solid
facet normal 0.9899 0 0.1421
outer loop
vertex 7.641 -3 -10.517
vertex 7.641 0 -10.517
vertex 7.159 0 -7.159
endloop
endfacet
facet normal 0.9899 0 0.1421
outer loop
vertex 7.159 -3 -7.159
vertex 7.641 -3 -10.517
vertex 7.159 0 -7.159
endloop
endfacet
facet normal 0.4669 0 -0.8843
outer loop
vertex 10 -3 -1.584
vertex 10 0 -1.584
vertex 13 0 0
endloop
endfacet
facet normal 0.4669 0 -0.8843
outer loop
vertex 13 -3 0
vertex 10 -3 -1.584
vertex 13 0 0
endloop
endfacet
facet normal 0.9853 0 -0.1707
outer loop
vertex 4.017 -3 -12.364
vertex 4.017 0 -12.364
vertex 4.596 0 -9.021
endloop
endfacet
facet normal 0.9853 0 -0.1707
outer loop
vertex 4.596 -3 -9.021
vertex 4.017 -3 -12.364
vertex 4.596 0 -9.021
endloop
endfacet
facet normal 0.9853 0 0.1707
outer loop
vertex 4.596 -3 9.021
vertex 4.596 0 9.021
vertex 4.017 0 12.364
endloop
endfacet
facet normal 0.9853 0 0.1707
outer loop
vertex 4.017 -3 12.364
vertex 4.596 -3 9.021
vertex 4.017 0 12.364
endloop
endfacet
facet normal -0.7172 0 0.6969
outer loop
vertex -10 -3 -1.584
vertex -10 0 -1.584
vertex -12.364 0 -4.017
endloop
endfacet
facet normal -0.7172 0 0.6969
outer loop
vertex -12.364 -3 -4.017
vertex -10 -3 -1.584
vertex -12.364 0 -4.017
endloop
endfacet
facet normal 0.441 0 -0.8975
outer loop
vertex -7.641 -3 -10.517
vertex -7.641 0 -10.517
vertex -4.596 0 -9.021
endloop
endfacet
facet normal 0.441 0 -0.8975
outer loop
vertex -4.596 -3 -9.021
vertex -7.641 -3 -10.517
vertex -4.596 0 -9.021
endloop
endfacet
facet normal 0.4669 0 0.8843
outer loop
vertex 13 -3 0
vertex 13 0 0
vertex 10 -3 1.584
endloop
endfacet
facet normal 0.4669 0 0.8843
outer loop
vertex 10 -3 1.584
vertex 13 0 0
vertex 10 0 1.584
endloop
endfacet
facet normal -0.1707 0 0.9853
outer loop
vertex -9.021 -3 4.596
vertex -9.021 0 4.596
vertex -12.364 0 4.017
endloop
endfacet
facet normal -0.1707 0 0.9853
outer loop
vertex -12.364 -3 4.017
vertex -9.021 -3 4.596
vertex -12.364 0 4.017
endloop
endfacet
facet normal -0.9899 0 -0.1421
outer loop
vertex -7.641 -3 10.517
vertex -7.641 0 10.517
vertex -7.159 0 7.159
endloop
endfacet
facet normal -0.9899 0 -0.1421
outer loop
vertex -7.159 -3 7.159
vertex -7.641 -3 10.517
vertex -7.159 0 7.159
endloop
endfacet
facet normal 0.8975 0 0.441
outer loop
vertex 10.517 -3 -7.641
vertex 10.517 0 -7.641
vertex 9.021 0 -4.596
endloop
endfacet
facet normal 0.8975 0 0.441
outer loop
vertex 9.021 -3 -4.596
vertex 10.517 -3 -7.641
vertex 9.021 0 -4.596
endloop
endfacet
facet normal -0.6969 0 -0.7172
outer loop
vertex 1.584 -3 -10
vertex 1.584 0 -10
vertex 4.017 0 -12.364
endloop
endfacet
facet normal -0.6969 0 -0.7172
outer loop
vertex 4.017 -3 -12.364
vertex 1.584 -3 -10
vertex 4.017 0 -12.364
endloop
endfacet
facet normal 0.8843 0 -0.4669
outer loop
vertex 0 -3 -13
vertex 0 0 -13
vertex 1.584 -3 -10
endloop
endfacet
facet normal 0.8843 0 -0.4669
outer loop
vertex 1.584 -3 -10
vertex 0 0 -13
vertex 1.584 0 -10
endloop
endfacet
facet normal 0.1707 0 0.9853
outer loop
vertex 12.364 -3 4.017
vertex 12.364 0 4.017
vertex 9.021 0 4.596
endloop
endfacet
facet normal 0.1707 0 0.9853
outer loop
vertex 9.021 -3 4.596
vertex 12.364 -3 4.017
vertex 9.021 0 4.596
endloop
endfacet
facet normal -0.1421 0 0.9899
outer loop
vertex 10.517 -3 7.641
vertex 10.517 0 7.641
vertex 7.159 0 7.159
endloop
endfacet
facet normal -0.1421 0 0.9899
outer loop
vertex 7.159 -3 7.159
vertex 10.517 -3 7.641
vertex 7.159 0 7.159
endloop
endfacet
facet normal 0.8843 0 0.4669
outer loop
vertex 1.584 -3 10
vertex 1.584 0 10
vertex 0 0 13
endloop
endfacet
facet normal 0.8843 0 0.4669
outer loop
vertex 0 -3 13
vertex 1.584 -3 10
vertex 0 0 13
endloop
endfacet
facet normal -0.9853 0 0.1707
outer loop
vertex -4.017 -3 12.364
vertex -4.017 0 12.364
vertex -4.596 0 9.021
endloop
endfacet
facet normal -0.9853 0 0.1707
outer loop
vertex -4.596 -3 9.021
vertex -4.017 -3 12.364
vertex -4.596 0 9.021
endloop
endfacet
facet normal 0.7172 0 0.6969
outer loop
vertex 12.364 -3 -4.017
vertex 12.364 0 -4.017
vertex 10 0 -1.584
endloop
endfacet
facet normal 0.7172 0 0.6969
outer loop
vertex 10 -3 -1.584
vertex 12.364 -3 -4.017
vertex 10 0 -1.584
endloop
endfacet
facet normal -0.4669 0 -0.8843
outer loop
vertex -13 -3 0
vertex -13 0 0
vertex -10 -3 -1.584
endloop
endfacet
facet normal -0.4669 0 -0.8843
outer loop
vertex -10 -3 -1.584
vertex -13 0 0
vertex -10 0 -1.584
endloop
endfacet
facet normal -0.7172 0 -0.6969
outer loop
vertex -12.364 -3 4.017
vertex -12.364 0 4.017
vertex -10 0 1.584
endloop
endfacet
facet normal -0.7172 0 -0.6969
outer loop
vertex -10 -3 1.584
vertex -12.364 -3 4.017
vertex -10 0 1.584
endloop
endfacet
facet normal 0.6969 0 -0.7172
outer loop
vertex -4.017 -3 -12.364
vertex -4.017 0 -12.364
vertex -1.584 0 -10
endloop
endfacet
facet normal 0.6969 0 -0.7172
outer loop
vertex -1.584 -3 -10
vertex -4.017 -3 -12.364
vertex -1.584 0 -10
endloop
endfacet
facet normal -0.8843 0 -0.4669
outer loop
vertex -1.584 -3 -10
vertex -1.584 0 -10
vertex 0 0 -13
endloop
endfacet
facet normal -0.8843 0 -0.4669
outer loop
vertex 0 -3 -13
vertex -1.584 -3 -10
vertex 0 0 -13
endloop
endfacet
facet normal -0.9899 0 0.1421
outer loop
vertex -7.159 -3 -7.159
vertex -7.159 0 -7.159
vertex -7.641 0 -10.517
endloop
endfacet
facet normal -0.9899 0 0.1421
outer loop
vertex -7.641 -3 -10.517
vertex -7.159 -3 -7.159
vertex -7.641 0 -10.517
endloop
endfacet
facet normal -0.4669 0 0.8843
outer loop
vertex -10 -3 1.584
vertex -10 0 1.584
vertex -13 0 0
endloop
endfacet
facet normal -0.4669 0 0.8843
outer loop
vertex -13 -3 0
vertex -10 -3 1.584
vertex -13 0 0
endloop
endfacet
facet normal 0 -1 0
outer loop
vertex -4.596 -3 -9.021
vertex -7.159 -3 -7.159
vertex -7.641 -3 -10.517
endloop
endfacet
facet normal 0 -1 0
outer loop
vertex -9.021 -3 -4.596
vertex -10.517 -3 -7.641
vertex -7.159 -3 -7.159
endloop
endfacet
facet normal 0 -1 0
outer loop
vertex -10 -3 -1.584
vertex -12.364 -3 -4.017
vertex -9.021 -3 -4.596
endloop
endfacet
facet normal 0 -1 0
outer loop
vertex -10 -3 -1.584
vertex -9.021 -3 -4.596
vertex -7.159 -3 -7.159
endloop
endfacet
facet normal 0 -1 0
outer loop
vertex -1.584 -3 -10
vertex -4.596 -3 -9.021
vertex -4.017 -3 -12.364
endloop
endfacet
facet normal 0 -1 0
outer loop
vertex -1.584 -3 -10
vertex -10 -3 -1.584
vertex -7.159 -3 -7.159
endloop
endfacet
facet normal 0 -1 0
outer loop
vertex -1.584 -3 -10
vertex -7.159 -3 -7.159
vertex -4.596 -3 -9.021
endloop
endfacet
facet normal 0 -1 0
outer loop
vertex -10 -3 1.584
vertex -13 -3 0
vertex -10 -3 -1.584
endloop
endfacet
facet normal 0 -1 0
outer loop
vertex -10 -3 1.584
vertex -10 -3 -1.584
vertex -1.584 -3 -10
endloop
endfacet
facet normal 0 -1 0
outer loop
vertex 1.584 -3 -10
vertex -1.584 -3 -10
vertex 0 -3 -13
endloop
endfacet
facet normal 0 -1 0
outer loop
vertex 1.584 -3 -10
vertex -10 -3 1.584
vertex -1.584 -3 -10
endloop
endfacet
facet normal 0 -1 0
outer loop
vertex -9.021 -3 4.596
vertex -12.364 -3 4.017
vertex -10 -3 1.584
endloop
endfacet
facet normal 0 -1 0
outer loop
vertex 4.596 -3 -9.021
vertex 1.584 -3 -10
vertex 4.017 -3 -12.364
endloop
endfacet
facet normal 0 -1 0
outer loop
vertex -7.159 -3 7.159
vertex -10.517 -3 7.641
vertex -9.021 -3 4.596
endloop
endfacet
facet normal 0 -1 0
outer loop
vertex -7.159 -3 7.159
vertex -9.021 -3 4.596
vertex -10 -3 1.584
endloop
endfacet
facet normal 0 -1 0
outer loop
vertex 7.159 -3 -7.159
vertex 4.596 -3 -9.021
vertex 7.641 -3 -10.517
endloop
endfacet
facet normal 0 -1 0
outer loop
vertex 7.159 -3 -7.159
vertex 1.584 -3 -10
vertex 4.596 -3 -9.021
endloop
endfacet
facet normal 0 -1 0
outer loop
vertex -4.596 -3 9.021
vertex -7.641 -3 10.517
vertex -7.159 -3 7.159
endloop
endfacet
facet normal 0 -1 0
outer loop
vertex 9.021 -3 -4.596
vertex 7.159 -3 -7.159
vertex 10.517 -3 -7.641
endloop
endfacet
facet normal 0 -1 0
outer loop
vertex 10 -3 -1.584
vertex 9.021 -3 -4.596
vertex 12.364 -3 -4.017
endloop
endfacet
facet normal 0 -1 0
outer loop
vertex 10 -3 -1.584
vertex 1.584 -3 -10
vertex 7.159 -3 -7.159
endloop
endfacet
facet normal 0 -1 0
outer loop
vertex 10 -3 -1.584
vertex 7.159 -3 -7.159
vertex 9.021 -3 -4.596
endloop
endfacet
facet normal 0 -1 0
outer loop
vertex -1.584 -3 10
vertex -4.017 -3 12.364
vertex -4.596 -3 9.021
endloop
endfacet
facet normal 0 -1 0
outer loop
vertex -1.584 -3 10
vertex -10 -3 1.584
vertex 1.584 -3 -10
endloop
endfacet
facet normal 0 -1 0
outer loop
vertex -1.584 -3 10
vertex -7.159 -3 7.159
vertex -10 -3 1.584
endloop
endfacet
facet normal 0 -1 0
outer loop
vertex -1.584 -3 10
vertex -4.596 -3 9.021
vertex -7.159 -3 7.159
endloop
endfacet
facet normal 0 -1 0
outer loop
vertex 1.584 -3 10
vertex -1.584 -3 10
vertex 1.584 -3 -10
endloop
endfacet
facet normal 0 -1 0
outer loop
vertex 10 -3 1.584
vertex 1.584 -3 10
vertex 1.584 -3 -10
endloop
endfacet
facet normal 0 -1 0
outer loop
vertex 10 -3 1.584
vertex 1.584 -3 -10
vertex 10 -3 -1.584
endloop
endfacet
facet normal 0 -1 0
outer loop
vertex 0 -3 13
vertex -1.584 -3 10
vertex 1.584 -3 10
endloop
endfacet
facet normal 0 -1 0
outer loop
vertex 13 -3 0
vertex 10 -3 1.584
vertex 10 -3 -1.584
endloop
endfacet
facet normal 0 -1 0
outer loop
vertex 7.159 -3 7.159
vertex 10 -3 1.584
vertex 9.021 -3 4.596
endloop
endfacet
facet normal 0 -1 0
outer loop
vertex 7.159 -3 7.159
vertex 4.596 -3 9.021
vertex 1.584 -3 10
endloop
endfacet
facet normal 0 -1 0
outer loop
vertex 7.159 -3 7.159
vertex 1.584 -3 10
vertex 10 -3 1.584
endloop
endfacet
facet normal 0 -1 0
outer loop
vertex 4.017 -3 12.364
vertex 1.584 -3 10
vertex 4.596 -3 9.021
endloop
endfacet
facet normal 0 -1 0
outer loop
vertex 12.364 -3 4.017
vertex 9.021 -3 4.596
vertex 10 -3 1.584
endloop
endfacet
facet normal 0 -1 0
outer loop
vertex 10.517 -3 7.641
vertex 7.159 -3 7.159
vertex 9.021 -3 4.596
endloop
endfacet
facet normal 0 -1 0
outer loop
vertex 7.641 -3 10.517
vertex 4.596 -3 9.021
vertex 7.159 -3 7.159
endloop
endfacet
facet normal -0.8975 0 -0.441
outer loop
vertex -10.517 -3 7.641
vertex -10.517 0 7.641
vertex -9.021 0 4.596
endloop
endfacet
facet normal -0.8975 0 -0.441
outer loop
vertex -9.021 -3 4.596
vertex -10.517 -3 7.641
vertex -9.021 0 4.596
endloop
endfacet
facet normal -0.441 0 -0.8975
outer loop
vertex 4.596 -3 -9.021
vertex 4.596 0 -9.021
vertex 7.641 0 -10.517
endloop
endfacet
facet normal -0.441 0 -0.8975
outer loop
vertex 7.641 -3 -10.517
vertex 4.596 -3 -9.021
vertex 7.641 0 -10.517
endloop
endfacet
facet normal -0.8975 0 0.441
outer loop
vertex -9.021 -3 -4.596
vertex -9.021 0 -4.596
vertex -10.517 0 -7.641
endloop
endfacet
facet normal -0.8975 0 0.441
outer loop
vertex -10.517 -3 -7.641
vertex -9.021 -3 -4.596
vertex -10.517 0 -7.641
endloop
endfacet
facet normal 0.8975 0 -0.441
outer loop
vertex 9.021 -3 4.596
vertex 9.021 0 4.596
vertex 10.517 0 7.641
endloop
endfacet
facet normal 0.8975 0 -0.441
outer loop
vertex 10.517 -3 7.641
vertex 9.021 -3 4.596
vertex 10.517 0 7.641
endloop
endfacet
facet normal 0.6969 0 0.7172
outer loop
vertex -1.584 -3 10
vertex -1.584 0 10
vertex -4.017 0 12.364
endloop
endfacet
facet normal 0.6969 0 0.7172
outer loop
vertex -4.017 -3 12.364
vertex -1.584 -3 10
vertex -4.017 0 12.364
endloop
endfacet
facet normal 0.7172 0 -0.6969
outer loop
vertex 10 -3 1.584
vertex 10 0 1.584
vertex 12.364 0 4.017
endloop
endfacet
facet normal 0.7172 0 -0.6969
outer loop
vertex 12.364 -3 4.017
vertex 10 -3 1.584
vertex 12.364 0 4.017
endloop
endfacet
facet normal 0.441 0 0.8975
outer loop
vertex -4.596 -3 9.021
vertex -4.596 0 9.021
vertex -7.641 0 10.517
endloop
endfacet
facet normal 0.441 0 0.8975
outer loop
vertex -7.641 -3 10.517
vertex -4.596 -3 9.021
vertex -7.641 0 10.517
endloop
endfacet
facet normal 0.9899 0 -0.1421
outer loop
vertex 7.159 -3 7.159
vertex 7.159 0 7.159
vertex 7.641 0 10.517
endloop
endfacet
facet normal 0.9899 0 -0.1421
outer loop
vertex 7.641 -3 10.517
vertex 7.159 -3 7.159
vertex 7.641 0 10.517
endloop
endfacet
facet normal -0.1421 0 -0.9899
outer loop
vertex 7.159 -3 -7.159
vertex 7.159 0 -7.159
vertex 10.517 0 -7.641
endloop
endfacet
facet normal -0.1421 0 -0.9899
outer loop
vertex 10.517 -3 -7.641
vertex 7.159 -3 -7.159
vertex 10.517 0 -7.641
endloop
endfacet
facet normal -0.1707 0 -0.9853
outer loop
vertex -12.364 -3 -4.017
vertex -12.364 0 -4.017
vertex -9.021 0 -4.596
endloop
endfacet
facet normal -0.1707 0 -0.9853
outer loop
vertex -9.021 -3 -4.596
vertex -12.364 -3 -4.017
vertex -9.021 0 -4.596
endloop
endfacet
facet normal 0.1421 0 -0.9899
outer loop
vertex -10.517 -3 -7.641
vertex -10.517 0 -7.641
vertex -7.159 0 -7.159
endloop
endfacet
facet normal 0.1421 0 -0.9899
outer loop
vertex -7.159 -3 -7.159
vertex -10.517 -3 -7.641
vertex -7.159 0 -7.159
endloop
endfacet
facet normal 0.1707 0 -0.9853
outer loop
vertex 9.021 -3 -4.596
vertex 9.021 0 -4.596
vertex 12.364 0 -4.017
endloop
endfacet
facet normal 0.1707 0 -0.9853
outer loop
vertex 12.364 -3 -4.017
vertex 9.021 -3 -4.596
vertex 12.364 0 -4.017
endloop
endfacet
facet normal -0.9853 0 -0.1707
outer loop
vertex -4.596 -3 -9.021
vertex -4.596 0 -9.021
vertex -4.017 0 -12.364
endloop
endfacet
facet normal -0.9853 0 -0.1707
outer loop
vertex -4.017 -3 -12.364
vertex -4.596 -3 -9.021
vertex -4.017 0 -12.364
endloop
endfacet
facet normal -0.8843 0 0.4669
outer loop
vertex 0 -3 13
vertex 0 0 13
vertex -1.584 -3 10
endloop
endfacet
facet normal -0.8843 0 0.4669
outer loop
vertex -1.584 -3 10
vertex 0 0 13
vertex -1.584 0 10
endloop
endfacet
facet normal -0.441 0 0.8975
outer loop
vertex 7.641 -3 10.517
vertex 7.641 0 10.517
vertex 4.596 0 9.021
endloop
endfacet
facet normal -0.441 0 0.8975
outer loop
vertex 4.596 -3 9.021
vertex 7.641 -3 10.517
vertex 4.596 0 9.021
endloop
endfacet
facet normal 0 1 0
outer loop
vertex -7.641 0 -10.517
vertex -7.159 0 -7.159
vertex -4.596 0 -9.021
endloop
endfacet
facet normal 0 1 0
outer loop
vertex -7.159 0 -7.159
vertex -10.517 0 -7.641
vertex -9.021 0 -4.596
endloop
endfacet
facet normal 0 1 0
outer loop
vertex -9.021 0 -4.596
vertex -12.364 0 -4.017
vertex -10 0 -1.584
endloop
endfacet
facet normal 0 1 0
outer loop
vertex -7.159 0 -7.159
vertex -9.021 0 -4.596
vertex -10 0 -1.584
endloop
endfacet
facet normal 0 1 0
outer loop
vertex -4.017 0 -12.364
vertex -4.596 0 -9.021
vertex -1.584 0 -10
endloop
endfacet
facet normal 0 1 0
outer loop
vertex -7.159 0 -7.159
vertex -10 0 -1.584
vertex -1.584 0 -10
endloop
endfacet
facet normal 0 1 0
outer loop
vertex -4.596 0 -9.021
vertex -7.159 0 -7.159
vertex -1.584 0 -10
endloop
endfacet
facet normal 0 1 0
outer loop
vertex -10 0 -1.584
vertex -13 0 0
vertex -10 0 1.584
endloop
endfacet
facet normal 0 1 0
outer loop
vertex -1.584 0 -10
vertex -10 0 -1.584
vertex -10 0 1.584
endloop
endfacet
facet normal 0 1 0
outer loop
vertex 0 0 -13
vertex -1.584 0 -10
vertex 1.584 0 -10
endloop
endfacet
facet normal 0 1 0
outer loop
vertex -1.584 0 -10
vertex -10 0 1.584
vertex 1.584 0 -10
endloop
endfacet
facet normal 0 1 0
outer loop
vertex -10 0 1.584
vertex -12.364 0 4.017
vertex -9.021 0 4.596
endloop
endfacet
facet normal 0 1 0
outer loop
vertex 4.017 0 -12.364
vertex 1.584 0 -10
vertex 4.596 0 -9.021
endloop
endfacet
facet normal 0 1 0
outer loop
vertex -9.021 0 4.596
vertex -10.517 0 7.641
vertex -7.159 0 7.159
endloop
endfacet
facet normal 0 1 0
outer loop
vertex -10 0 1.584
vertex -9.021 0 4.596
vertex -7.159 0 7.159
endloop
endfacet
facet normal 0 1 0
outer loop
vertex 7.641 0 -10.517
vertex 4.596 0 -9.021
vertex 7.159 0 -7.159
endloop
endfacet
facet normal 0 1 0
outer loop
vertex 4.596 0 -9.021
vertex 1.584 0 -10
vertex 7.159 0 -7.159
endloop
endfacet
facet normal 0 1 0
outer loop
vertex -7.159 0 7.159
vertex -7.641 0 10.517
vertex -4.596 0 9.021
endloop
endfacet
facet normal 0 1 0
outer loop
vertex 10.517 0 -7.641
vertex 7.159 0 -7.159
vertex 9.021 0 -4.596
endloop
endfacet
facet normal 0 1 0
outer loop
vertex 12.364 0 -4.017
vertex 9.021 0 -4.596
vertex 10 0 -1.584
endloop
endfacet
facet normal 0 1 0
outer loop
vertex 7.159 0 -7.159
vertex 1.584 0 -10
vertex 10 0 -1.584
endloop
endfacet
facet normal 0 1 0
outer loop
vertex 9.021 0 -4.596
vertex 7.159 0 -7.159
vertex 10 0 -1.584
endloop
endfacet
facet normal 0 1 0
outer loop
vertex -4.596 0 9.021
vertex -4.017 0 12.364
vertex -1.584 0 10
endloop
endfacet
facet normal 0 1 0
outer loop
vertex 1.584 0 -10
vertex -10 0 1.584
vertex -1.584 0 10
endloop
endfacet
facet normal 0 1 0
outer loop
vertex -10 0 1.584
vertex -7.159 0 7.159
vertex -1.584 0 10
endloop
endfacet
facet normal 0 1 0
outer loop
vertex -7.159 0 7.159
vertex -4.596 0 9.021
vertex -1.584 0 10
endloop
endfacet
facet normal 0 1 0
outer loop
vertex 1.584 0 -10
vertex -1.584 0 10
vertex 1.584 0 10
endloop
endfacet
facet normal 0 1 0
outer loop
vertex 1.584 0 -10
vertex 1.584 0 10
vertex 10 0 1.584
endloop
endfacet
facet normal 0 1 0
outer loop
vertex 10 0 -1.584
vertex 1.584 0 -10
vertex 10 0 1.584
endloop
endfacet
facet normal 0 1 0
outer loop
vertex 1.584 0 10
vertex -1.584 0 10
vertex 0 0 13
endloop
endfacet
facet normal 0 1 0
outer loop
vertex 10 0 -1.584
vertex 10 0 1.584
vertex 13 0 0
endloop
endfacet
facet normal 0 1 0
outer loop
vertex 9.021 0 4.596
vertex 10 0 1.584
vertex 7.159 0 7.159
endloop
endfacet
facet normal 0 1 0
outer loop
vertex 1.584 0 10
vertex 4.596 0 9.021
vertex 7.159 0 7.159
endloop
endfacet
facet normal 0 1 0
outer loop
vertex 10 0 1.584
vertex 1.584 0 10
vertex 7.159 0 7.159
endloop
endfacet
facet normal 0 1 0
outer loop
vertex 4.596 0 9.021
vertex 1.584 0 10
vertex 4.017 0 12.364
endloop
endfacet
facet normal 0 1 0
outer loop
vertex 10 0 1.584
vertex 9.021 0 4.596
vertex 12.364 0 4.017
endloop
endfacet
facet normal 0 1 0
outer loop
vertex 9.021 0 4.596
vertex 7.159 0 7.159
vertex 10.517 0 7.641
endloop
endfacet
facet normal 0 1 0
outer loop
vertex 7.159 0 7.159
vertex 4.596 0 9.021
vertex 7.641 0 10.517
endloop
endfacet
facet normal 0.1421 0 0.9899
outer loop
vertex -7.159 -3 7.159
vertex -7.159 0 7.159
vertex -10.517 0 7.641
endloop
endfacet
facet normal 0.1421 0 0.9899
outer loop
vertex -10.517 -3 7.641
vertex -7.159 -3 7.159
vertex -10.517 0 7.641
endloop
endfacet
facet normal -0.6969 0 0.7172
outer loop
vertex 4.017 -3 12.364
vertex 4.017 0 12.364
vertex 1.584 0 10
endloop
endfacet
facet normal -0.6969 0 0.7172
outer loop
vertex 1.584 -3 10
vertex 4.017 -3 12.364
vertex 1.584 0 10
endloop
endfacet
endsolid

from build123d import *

# Parameters (mm, degrees)
F1_DEPTH = 3


with BuildPart() as f1:
    # F0 (on Front) → F1 (new body)
    with BuildSketch(Plane.XZ):
        Polygon((13, 0), (10, 1.5838444032), (10, -1.5838444032), align=None)
        Polygon((10, -1.5838444032), (10, 1.5838444032), (9.0211303259, 4.5964954843), (7.1592095616, 7.1592095616), (4.5964954843, 9.0211303259), (1.5838444032, 10), (-1.5838444032, 10), (-4.5964954843, 9.0211303259), (-7.1592095616, 7.1592095616), (-9.0211303259, 4.5964954843), (-10, 1.5838444032), (-10, -1.5838444032), (-9.0211303259, -4.5964954843), (-7.1592095616, -7.1592095616), (-4.5964954843, -9.0211303259), (-1.5838444032, -10), (1.5838444032, -10), (4.5964954843, -9.0211303259), (7.1592095616, -7.1592095616), (9.0211303259, -4.5964954843), align=None)
        Polygon((9.0211303259, 4.5964954843), (10, 1.5838444032), (12.3637347118, 4.0172209269), align=None)
        Polygon((12.3637347118, -4.0172209269), (10, -1.5838444032), (9.0211303259, -4.5964954843), align=None)
        Polygon((7.1592095616, 7.1592095616), (9.0211303259, 4.5964954843), (10.5172209269, 7.6412082798), align=None)
        Polygon((10.5172209269, -7.6412082798), (9.0211303259, -4.5964954843), (7.1592095616, -7.1592095616), align=None)
        Polygon((4.5964954843, 9.0211303259), (7.1592095616, 7.1592095616), (7.6412082798, 10.5172209269), align=None)
        Polygon((7.6412082798, -10.5172209269), (7.1592095616, -7.1592095616), (4.5964954843, -9.0211303259), align=None)
        Polygon((1.5838444032, 10), (4.5964954843, 9.0211303259), (4.0172209269, 12.3637347118), align=None)
        Polygon((4.0172209269, -12.3637347118), (4.5964954843, -9.0211303259), (1.5838444032, -10), align=None)
        Polygon((-1.5838444032, 10), (1.5838444032, 10), (0, 13), align=None)
        Polygon((0, -13), (1.5838444032, -10), (-1.5838444032, -10), align=None)
        Polygon((-4.5964954843, 9.0211303259), (-1.5838444032, 10), (-4.0172209269, 12.3637347118), align=None)
        Polygon((-4.0172209269, -12.3637347118), (-1.5838444032, -10), (-4.5964954843, -9.0211303259), align=None)
        Polygon((-7.1592095616, 7.1592095616), (-4.5964954843, 9.0211303259), (-7.6412082798, 10.5172209269), align=None)
        Polygon((-7.6412082798, -10.5172209269), (-4.5964954843, -9.0211303259), (-7.1592095616, -7.1592095616), align=None)
        Polygon((-9.0211303259, 4.5964954843), (-7.1592095616, 7.1592095616), (-10.5172209269, 7.6412082798), align=None)
        Polygon((-10.5172209269, -7.6412082798), (-7.1592095616, -7.1592095616), (-9.0211303259, -4.5964954843), align=None)
        Polygon((-10, 1.5838444032), (-9.0211303259, 4.5964954843), (-12.3637347118, 4.0172209269), align=None)
        Polygon((-12.3637347118, -4.0172209269), (-9.0211303259, -4.5964954843), (-10, -1.5838444032), align=None)
        Polygon((-10, -1.5838444032), (-10, 1.5838444032), (-13, 0), align=None)
    extrude(amount=F1_DEPTH)


solid = f1.part
